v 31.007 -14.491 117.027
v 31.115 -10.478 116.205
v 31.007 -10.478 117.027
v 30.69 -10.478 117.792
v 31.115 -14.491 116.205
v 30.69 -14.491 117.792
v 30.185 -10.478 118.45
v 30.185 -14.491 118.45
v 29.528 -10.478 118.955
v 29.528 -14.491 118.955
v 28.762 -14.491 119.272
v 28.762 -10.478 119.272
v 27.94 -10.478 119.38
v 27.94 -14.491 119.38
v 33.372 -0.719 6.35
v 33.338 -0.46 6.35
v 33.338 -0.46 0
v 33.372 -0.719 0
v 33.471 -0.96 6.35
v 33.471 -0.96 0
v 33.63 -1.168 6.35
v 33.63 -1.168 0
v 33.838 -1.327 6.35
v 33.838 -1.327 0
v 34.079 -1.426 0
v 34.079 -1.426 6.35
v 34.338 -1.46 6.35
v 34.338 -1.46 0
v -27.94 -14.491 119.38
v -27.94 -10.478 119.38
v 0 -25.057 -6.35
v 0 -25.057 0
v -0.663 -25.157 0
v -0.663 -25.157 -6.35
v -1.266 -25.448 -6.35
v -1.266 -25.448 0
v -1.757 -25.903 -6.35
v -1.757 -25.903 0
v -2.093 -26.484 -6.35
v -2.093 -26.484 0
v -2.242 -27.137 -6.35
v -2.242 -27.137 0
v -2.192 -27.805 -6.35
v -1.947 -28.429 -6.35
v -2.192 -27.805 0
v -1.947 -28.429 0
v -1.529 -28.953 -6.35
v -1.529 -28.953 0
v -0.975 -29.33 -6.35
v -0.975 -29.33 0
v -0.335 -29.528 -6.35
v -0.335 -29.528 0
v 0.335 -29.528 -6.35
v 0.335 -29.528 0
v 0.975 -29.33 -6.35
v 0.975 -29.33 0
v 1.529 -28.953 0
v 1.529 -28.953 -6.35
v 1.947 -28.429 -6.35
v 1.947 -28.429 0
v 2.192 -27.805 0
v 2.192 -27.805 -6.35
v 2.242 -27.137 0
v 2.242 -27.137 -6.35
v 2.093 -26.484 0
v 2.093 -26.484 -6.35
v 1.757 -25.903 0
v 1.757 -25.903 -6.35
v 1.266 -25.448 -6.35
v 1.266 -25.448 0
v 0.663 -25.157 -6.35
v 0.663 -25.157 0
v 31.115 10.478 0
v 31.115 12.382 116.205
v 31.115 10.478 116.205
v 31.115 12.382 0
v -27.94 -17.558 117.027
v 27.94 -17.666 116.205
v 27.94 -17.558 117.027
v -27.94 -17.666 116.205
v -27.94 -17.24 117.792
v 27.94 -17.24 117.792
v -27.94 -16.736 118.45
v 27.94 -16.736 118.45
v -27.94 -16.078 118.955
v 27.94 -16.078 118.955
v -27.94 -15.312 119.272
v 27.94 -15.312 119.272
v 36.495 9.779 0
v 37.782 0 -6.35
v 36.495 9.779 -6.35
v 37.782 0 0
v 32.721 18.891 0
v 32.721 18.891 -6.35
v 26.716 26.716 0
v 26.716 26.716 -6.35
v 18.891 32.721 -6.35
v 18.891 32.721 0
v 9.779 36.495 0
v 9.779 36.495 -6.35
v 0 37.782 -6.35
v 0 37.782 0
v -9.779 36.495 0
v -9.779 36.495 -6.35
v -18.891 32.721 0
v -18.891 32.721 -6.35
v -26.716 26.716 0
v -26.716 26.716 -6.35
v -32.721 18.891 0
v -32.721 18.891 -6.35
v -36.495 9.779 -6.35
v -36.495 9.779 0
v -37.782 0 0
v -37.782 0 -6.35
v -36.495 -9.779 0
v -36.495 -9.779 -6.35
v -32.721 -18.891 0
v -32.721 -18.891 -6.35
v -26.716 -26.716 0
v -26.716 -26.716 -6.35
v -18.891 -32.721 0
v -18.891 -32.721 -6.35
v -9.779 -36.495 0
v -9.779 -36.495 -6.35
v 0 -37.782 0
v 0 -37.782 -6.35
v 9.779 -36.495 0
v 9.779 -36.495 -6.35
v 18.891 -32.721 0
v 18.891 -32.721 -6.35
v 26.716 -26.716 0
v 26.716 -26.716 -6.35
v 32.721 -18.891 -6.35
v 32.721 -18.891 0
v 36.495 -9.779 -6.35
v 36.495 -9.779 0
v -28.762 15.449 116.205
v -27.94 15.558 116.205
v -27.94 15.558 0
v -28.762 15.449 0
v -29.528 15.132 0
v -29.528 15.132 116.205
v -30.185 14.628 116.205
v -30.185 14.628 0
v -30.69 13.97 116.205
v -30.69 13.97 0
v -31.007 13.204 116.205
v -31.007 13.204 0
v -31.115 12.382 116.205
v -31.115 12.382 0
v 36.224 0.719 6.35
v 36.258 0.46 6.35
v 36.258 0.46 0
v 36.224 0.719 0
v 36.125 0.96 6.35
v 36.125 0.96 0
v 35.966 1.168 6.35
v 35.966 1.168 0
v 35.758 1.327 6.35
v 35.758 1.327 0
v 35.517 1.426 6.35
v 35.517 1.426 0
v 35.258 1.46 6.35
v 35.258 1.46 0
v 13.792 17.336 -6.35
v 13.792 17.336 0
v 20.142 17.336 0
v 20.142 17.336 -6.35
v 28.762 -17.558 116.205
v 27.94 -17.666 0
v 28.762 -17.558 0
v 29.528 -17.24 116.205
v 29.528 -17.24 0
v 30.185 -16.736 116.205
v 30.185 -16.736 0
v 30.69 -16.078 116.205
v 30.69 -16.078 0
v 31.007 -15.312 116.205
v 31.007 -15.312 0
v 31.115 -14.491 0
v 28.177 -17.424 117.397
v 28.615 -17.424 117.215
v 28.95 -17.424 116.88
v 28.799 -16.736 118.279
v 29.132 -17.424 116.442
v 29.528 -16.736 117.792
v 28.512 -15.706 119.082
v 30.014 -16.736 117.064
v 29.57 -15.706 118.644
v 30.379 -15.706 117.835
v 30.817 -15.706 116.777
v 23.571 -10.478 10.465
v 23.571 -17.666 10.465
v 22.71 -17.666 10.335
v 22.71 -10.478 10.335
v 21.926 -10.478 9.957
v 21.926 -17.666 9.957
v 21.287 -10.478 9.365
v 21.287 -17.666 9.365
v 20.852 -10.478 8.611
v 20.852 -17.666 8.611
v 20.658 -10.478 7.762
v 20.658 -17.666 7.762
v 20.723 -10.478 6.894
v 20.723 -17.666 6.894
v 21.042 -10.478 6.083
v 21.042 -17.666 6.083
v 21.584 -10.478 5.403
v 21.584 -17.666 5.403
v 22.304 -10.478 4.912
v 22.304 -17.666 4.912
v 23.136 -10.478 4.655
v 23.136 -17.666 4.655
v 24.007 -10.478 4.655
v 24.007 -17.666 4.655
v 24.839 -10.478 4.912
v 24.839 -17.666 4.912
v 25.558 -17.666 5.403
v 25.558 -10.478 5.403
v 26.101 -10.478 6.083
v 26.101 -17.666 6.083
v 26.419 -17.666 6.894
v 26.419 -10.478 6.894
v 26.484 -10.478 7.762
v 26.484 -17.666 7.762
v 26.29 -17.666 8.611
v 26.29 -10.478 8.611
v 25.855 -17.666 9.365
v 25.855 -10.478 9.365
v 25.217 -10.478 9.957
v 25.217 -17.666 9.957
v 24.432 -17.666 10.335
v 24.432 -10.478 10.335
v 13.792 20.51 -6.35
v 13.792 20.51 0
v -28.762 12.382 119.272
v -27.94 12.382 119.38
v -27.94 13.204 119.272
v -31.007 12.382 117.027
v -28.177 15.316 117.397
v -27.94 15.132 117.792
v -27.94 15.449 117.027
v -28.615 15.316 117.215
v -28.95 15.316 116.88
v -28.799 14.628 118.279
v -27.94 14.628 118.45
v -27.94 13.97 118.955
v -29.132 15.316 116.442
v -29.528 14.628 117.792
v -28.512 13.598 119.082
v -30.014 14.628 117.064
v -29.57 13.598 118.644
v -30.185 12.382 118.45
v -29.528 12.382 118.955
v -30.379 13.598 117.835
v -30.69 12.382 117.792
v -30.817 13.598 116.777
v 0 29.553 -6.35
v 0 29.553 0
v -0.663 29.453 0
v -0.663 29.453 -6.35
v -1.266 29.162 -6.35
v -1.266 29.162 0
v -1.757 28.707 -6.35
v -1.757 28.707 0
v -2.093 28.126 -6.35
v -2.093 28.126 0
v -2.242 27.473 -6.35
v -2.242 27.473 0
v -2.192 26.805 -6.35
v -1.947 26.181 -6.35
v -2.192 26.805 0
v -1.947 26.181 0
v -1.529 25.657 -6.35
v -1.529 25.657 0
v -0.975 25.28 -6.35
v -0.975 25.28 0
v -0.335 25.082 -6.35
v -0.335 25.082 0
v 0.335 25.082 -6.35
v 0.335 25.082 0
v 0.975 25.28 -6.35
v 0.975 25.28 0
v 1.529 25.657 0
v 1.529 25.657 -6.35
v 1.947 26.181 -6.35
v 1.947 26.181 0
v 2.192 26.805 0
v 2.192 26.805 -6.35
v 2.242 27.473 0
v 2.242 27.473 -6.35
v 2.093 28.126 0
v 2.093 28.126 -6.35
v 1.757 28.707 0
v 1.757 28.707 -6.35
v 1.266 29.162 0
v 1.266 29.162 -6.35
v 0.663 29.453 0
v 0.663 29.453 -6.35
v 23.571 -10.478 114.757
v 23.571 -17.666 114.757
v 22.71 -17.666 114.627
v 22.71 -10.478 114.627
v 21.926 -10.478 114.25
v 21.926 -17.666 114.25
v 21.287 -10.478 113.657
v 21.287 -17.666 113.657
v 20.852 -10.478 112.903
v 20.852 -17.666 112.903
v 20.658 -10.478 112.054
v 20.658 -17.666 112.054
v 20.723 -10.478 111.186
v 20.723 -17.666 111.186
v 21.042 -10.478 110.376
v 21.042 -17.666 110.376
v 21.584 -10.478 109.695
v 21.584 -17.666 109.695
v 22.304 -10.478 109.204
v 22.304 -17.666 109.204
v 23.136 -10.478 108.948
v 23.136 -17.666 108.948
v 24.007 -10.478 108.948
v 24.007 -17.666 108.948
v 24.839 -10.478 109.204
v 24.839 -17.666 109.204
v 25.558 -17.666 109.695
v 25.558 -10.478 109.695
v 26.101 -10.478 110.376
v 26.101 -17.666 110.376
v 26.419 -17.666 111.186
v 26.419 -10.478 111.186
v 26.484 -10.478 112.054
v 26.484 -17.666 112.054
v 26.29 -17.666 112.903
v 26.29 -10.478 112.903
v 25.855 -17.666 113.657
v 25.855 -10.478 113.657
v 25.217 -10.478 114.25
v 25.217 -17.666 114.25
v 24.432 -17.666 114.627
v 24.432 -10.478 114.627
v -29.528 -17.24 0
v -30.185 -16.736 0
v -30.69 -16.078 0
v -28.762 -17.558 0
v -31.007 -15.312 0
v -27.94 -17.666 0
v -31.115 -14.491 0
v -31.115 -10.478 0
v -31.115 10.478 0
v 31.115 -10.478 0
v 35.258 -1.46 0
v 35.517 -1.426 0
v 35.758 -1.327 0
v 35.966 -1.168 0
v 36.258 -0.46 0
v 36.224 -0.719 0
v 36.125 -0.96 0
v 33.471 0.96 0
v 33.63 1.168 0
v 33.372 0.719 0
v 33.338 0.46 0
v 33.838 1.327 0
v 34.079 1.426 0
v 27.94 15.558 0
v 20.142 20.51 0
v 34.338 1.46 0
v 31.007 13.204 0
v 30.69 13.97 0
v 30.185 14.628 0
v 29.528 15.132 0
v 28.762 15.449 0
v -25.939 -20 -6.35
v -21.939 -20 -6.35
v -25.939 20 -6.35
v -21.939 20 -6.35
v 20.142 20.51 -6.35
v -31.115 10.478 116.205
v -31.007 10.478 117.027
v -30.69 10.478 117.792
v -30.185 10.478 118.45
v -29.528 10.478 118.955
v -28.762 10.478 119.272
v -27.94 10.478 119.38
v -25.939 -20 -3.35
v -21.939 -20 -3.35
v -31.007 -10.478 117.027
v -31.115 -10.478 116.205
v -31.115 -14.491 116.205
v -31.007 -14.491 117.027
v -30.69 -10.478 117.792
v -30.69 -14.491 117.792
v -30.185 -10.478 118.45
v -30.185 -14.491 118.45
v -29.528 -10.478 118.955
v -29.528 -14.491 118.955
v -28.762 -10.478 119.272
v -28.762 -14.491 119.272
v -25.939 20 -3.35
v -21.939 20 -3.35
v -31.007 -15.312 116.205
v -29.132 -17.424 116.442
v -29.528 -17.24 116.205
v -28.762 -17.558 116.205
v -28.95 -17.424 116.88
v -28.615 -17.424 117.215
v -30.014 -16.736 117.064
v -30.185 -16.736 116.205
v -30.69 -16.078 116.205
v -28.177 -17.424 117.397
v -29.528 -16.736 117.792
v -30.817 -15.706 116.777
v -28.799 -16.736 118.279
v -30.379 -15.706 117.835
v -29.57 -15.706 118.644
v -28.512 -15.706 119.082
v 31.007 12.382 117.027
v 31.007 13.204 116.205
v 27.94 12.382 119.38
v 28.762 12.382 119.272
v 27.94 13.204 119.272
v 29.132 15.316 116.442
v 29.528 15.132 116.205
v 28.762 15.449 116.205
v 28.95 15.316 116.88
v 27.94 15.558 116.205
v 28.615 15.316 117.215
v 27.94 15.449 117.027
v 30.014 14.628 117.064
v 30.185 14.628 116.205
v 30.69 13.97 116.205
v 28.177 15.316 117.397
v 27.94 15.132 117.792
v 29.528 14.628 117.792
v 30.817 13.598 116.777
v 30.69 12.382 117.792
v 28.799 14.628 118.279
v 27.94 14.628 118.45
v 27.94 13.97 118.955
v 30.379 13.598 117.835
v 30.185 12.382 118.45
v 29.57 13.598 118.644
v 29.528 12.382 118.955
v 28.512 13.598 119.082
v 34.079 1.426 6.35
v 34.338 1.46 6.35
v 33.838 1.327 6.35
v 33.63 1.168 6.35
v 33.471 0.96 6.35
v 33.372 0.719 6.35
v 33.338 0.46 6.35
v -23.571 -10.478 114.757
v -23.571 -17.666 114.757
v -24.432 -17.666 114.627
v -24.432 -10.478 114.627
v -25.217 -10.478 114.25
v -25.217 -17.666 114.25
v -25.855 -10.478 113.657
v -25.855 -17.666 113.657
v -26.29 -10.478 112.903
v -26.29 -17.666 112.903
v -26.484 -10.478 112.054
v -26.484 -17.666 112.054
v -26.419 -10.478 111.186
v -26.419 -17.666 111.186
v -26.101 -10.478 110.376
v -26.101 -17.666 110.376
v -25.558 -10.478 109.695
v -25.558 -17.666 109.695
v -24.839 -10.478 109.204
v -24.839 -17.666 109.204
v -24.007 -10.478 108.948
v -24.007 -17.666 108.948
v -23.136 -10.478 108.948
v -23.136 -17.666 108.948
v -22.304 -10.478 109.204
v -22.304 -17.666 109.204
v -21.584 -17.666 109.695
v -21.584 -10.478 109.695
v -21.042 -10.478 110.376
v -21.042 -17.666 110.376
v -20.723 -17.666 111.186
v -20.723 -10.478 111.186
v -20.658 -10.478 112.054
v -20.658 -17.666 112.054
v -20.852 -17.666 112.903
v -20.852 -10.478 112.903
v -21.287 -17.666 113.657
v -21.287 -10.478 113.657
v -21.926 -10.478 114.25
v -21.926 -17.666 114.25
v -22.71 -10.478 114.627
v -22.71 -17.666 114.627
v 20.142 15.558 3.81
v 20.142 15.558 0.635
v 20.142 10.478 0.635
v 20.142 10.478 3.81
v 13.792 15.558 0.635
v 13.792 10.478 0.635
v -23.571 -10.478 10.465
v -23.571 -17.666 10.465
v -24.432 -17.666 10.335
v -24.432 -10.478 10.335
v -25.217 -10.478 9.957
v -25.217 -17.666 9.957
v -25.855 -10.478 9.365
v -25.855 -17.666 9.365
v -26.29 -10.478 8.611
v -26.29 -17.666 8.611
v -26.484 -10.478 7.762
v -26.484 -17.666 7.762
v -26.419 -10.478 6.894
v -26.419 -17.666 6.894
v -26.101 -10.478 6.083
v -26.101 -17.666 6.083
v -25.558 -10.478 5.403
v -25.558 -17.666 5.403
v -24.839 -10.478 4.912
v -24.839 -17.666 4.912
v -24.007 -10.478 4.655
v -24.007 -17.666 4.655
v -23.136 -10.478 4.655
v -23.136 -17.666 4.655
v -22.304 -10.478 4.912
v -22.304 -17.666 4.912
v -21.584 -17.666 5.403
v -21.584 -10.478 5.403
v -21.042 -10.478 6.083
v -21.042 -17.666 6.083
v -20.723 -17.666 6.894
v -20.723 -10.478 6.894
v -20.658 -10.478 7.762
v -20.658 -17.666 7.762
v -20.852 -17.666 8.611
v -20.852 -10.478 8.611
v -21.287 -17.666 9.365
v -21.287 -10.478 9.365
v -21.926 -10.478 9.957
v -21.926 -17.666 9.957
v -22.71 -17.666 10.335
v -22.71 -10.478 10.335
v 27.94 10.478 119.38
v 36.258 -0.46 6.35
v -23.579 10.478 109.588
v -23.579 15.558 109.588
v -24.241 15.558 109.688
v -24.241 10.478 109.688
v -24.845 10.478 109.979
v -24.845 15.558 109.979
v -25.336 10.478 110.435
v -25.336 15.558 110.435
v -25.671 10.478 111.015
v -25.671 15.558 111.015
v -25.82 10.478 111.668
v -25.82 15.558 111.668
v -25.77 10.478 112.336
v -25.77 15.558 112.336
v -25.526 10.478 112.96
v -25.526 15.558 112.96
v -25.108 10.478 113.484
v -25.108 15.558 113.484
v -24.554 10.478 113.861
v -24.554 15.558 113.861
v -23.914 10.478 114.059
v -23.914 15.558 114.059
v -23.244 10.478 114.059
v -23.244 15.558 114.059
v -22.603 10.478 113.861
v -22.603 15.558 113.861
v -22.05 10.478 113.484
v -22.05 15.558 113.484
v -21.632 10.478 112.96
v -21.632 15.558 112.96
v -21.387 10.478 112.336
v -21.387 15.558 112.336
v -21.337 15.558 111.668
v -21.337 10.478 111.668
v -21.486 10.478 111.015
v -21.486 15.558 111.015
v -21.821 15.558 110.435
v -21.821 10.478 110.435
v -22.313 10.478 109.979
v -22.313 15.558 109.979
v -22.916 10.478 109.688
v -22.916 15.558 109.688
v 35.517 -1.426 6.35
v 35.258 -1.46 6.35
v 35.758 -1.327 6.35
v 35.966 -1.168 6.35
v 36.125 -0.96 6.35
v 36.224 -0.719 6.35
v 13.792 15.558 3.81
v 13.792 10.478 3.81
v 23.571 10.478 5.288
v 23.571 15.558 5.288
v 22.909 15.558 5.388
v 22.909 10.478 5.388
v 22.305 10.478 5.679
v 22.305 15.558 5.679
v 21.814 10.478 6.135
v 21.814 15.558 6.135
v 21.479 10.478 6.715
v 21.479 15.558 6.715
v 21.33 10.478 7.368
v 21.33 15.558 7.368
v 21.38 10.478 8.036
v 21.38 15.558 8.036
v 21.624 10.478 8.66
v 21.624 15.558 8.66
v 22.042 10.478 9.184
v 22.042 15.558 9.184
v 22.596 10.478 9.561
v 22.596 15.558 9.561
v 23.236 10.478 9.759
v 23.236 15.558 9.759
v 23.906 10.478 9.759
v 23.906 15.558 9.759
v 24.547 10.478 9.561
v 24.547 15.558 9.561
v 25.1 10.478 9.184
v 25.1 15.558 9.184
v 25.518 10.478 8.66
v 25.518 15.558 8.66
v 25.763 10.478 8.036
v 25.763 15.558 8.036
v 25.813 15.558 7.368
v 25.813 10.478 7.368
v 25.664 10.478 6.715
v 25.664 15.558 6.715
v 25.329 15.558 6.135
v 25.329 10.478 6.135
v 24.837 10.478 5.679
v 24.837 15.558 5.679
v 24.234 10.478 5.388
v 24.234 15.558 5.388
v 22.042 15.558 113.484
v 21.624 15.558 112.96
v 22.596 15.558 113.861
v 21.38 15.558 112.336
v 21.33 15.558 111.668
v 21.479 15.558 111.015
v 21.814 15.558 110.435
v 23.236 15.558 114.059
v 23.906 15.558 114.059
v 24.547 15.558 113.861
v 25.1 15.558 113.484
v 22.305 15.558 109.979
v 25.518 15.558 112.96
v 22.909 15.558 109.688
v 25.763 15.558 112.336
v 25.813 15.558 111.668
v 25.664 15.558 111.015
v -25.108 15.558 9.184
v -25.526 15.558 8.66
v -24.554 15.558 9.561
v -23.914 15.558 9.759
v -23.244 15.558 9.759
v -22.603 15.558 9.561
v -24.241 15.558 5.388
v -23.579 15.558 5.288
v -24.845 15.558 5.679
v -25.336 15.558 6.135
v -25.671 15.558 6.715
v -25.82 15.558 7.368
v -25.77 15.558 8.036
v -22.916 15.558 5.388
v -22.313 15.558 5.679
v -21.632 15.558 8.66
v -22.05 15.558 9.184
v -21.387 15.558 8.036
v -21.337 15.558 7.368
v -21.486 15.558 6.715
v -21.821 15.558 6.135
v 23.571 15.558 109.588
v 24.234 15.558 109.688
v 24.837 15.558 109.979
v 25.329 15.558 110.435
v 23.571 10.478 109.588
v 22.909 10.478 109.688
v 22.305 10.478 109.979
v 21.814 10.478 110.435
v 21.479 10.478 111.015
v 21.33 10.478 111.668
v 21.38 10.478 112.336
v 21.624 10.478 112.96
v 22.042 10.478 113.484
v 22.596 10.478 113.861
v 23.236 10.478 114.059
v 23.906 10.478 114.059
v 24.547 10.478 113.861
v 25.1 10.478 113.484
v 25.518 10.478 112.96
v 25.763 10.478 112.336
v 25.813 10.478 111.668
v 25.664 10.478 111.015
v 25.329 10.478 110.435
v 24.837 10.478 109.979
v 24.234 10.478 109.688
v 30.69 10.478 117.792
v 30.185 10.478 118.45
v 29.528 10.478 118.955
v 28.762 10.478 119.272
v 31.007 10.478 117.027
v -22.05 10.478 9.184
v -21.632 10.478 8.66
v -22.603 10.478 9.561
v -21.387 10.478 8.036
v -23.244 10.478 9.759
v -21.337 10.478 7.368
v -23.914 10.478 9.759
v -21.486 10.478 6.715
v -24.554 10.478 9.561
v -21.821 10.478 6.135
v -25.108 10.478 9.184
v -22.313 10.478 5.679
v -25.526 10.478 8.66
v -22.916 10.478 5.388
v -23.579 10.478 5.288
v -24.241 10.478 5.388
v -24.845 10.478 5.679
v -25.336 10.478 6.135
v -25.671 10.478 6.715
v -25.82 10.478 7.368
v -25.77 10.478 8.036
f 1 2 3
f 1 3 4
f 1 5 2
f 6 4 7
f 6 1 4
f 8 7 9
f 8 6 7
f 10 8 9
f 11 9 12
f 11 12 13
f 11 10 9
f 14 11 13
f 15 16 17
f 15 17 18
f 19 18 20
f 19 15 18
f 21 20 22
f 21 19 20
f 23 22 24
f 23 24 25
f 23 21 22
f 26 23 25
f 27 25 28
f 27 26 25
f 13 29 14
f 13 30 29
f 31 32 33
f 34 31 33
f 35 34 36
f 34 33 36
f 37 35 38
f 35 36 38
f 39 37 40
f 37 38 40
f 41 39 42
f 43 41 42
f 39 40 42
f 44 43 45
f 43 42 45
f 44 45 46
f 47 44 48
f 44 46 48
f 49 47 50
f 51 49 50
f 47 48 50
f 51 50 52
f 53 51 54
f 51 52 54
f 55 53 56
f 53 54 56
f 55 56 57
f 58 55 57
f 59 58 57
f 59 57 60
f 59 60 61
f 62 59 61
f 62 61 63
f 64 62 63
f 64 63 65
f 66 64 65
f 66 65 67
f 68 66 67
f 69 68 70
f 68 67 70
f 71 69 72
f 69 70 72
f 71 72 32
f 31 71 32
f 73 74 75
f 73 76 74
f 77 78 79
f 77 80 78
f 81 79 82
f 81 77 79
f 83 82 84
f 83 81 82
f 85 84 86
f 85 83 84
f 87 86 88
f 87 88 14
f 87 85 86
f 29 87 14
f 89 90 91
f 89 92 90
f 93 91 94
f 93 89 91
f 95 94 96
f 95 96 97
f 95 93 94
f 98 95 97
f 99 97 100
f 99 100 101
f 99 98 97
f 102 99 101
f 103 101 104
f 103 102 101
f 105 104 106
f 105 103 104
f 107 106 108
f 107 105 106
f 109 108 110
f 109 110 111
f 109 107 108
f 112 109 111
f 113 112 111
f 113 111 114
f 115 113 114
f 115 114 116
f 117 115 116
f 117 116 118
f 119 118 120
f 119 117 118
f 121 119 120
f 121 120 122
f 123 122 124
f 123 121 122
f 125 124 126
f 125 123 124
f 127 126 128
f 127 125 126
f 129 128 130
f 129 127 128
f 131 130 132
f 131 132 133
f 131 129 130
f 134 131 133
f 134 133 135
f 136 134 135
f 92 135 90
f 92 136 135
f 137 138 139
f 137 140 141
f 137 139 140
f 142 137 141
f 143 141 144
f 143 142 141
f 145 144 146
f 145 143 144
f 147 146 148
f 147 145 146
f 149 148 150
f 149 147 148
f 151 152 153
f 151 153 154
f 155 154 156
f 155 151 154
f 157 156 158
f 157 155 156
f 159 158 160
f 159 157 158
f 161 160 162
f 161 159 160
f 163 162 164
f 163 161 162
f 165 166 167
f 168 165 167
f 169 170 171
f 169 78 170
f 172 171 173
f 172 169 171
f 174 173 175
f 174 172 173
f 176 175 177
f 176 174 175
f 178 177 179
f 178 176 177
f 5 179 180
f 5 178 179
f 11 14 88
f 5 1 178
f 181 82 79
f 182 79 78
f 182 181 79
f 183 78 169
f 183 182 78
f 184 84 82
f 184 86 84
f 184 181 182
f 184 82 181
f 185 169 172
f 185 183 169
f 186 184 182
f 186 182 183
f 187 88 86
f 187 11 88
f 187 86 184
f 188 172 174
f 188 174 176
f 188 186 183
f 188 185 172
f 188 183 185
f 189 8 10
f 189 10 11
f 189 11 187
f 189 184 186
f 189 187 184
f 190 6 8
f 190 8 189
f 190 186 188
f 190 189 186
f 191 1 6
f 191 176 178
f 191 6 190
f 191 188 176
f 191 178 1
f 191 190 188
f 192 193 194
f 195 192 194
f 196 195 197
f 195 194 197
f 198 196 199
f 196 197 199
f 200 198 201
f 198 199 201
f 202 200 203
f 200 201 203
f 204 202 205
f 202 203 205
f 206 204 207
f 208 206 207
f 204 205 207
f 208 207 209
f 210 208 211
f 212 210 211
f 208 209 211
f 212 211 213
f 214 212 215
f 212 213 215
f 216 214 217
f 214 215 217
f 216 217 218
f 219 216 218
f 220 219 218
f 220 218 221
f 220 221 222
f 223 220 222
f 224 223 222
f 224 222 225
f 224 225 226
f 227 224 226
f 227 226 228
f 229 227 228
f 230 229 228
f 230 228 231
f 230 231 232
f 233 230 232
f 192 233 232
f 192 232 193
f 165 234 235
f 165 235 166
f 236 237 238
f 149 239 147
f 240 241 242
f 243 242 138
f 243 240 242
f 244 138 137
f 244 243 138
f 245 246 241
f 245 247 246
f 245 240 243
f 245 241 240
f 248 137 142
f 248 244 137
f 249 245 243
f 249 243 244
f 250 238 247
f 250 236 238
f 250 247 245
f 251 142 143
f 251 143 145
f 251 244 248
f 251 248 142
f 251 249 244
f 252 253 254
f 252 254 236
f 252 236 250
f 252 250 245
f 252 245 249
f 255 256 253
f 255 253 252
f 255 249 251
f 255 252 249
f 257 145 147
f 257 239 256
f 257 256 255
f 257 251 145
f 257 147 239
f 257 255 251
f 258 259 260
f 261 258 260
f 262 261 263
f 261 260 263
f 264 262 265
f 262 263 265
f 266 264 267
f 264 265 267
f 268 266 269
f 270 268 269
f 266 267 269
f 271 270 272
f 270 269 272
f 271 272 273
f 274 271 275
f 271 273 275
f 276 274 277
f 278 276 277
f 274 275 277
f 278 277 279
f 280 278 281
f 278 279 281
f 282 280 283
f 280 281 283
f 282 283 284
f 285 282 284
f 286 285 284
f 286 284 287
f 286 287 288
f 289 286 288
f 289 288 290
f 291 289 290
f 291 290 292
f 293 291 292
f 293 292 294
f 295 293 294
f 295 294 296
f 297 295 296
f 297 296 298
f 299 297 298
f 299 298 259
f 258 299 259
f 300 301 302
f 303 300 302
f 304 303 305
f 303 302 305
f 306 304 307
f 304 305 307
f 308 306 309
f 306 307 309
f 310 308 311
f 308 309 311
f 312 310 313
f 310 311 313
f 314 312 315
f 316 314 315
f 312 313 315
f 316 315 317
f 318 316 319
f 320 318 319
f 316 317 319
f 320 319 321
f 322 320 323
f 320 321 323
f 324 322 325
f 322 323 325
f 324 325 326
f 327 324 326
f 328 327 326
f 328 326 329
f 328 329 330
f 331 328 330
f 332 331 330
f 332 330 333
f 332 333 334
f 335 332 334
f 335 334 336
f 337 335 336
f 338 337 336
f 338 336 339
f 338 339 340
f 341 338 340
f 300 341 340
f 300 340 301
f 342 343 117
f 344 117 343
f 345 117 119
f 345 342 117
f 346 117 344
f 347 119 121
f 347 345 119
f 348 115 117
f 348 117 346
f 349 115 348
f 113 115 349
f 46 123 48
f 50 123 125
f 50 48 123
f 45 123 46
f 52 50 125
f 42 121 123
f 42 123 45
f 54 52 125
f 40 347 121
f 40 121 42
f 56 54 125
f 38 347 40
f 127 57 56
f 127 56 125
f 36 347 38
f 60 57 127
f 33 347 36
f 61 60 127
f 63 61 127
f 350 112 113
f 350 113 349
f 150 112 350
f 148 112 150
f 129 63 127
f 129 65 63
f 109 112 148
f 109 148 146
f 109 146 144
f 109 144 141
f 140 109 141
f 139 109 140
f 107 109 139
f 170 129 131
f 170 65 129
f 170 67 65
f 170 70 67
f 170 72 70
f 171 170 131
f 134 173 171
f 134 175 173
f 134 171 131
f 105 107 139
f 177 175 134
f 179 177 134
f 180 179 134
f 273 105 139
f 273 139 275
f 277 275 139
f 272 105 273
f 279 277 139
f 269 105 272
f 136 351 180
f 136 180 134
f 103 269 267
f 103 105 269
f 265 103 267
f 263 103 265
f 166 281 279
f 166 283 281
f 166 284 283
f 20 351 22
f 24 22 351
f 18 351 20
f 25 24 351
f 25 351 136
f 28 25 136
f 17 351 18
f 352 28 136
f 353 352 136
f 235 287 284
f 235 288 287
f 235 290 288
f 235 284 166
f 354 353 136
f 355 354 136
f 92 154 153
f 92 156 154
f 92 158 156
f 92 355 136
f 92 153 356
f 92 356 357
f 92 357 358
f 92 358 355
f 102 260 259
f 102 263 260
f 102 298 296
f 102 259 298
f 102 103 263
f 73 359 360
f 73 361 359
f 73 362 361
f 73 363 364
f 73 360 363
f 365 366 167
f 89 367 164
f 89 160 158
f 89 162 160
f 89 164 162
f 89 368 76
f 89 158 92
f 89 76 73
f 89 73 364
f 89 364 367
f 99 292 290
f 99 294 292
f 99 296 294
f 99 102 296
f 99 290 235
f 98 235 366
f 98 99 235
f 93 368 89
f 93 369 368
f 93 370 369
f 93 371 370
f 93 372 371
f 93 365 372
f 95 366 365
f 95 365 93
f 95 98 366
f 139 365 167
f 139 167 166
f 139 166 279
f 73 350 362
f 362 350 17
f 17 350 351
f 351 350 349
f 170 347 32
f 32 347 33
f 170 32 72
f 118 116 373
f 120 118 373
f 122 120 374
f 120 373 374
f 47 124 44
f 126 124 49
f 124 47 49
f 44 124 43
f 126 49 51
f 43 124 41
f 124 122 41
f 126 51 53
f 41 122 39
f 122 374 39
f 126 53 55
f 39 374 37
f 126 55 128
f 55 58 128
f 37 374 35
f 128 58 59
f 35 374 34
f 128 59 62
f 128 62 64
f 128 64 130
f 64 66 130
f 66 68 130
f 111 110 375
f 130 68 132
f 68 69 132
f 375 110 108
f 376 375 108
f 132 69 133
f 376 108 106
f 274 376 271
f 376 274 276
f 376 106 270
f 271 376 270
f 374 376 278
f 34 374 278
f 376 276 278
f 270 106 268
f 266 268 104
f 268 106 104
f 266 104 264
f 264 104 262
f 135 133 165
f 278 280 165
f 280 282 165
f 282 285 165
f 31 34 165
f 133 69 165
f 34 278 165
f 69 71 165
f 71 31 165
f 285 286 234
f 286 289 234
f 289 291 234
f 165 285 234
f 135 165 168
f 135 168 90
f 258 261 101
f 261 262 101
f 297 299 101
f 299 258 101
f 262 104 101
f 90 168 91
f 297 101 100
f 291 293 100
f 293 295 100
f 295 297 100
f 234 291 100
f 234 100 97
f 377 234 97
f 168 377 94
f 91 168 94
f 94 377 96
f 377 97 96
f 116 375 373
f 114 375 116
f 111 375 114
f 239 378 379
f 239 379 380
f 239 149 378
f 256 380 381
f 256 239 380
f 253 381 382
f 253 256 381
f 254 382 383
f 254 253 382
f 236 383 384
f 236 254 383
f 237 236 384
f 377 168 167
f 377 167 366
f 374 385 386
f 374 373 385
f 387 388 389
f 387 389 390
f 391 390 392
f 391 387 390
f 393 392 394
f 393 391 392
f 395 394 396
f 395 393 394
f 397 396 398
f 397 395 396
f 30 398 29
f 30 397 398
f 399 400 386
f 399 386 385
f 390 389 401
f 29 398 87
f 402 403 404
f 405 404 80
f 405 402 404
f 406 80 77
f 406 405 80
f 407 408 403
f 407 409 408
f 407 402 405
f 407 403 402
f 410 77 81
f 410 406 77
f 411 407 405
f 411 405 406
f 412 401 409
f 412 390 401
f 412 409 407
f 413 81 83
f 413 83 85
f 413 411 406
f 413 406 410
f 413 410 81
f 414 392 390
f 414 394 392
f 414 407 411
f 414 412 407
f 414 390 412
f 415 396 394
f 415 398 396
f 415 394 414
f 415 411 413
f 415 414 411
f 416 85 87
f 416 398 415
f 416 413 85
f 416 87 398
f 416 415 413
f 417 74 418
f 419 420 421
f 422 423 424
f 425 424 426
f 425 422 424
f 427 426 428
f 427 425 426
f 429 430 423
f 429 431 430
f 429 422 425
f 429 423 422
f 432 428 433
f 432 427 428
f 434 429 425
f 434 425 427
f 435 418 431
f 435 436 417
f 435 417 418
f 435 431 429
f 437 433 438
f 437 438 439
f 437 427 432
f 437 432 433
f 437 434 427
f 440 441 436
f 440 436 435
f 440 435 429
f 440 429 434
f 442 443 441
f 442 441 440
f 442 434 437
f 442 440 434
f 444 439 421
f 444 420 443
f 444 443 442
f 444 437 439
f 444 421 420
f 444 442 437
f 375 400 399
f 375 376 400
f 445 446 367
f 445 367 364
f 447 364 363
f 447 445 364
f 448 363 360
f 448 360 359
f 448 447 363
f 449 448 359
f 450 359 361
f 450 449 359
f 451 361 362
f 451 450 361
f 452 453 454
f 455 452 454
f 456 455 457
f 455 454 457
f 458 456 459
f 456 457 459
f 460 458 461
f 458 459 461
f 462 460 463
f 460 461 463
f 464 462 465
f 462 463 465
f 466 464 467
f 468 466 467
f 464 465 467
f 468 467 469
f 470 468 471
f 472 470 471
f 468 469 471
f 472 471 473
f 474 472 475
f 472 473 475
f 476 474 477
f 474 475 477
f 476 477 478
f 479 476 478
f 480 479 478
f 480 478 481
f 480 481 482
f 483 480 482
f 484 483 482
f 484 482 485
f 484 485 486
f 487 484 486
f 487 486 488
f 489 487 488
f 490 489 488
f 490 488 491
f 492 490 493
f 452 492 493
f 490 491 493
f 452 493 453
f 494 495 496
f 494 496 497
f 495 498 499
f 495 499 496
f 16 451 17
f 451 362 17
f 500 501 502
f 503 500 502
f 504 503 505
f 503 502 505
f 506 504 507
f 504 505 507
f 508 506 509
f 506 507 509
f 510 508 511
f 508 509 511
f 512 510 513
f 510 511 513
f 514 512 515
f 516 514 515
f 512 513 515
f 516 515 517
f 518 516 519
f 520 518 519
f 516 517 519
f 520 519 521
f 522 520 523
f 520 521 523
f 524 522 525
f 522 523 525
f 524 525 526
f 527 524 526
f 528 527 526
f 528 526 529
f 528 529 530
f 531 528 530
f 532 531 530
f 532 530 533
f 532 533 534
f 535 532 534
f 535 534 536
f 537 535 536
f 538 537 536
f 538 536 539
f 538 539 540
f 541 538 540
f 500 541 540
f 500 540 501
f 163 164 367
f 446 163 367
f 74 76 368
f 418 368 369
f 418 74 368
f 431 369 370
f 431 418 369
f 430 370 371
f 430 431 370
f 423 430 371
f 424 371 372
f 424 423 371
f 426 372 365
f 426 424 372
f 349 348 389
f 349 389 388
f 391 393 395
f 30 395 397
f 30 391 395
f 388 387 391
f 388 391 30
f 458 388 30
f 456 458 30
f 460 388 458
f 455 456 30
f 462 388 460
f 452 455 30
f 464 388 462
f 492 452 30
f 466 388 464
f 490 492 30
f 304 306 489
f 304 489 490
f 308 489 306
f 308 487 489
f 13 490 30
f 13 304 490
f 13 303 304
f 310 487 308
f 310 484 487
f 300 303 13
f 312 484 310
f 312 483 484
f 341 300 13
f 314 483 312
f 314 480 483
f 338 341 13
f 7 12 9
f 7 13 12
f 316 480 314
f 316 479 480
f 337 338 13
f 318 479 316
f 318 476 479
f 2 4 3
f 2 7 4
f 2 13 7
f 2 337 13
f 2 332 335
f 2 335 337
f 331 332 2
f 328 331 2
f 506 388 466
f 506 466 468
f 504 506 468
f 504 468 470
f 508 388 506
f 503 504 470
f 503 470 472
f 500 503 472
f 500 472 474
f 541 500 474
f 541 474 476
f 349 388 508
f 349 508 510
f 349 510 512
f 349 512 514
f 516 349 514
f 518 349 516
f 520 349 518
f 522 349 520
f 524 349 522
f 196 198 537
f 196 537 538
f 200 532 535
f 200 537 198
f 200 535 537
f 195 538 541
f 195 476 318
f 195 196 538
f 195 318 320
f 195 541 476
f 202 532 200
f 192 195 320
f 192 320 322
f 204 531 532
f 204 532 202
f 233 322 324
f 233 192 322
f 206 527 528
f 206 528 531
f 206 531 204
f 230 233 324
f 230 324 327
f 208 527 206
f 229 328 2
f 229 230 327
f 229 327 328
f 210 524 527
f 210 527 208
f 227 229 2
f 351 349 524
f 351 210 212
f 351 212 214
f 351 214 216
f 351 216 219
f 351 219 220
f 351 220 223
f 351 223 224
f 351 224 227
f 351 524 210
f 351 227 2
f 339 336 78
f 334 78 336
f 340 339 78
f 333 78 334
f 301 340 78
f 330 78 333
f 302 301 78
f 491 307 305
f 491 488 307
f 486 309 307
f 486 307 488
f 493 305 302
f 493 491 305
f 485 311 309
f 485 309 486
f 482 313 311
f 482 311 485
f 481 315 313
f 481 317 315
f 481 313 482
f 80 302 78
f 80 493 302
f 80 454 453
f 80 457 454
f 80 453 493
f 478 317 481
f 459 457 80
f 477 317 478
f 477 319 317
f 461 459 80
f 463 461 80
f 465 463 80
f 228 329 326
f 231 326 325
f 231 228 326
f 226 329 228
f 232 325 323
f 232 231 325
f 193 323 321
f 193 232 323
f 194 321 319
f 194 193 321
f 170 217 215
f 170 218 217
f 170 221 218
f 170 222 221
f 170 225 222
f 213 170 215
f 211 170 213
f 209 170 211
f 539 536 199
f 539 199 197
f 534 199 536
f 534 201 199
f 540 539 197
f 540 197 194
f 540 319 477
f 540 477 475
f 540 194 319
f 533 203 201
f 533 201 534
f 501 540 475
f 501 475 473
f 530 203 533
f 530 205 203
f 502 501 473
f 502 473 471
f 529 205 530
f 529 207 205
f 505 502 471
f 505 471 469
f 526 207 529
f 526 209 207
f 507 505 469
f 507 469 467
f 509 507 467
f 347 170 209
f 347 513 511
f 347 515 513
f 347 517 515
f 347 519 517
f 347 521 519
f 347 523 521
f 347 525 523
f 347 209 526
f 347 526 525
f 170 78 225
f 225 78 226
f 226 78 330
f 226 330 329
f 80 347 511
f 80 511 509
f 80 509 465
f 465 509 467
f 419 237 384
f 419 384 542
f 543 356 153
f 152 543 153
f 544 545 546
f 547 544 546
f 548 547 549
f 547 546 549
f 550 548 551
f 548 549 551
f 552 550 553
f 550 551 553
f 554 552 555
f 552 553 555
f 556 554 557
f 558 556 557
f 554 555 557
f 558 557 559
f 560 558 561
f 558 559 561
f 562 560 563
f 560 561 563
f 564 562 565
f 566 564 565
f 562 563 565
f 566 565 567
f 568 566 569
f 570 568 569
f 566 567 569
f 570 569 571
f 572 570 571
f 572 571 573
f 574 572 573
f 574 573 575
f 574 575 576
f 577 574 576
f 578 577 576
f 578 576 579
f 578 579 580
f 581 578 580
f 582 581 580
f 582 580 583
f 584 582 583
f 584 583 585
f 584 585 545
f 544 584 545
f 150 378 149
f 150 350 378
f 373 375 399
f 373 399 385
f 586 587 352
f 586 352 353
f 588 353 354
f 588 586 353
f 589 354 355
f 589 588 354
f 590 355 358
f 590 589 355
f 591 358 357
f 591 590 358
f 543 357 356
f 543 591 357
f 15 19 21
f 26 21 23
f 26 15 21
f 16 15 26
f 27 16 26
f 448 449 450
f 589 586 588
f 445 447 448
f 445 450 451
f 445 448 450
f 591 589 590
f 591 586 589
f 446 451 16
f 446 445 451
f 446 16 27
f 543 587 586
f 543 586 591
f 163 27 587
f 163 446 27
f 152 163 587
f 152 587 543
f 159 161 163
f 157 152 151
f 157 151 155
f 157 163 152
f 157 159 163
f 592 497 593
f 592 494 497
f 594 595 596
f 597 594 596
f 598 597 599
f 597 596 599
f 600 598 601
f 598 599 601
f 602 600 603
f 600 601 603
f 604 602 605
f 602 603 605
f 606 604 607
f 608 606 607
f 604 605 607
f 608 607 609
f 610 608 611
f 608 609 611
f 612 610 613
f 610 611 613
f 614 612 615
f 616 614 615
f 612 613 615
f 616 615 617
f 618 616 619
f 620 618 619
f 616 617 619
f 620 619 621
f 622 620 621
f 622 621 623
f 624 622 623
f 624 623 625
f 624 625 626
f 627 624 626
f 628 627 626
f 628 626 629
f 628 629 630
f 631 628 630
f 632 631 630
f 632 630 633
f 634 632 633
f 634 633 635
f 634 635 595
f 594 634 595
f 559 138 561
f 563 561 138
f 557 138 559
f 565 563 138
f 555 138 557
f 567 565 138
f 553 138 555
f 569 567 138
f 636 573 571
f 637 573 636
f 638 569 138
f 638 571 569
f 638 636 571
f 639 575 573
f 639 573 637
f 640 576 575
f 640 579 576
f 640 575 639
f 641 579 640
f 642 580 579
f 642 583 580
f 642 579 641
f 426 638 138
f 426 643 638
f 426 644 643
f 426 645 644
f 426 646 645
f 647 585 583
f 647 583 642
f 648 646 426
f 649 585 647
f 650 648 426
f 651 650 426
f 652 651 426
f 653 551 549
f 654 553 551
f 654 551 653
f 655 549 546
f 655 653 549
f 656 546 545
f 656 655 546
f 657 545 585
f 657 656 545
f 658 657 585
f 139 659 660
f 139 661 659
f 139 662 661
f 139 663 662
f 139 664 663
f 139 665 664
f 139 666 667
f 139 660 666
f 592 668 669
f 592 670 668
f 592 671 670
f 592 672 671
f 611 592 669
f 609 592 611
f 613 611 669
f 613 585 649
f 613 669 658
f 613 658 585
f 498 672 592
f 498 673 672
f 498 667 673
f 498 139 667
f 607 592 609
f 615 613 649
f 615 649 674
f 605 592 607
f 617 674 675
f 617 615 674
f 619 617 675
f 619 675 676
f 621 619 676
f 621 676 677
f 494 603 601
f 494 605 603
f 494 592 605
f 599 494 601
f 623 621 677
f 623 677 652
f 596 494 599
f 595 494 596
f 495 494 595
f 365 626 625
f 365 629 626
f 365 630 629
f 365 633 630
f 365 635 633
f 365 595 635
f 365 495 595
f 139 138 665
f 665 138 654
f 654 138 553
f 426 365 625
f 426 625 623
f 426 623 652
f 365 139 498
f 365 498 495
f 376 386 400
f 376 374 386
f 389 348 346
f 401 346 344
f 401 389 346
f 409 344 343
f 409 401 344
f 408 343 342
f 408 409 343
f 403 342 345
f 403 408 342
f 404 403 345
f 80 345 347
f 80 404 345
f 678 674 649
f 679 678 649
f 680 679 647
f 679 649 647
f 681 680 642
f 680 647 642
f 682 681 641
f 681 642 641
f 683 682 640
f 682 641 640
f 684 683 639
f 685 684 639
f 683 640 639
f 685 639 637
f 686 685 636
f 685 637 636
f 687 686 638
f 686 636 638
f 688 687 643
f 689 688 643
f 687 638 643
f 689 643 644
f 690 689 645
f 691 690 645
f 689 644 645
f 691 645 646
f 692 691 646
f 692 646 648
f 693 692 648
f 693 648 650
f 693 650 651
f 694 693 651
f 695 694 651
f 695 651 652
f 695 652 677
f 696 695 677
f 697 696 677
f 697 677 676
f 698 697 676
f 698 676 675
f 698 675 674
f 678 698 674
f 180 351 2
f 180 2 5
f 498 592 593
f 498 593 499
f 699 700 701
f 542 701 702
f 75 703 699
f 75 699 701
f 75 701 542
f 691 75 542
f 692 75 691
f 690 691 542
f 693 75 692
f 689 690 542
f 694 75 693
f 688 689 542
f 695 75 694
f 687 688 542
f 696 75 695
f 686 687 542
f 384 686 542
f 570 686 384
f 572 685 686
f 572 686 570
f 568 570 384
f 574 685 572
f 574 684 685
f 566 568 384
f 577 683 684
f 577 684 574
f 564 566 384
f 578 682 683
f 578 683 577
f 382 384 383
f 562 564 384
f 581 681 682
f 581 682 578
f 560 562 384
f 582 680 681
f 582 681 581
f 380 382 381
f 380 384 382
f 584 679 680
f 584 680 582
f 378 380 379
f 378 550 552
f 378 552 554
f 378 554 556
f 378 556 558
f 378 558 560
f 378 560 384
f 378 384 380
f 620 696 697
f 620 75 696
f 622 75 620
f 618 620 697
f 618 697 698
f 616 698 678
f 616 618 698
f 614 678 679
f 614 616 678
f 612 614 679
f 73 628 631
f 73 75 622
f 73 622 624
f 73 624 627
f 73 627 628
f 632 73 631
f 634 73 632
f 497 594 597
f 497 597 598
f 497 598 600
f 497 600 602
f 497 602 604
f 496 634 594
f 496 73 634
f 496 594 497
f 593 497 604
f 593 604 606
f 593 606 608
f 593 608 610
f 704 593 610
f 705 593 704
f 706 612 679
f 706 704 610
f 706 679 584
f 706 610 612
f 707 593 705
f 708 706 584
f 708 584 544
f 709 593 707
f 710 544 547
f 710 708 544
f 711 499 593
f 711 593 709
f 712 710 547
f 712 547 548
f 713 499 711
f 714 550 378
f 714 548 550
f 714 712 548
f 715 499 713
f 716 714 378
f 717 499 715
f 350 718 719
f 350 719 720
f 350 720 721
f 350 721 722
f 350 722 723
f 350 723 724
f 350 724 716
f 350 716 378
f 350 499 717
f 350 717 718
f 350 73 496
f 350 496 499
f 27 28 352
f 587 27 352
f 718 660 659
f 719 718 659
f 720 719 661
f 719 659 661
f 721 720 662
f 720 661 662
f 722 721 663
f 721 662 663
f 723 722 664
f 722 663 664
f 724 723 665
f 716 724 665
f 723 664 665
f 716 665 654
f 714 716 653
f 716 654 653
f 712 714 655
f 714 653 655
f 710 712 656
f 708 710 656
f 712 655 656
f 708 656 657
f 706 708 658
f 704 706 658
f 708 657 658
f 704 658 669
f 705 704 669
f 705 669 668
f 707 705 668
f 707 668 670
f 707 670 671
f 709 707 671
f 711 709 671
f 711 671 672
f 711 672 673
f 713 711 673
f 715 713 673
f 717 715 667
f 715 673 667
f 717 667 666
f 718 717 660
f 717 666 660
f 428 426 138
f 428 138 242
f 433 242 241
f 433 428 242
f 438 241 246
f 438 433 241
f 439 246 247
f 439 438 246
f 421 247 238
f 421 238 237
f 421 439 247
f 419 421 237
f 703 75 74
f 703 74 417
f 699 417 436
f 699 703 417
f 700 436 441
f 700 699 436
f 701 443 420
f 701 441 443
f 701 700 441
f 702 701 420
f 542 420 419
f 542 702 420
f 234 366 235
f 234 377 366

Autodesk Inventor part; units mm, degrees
ref_plane "YZ Plane" through (0, 0, 0) normal (1, 0, 0) x (0, 1, 0)
ref_plane "XZ Plane" through (0, 0, 0) normal (0, 1, 0) x (-1, 0, 0)
ref_plane "XY Plane" through (0, 0, 0) normal (0, 0, 1) x (1, 0, 0)
sketch "Sketch1" plane through (0, 0, 0) normal (0, 0, 1) x (1, 0, 0)
  circle A0 centre (0, 0) radius 37.7825
  dimension "d0" = 75.565
extrude "Extrusion1" add sketch "Sketch1" against normal blind 6.35
sketch "Sketch2" plane through (0, 0, 0) normal (0, 0, 1) x (1, 0, 0)
  line L0 (-31.115, -10.4775) -> (31.115, -10.4775)
  line L1 (31.115, -10.4775) -> (31.115, -17.6657)
  line L2 (31.115, -17.6657) -> (-31.115, -17.6657)
  line L3 (-31.115, -17.6657) -> (-31.115, -10.4775)
  line L4 (-31.115, 15.5575) -> (31.115, 15.5575)
  line L5 (31.115, 15.5575) -> (31.115, 10.4775)
  line L6 (31.115, 10.4775) -> (-31.115, 10.4775)
  line L7 (-31.115, 10.4775) -> (-31.115, 15.5575)
  point P0 (0, 0)
  point P1 (31.115, -14.0716)
  point P2 (31.115, 13.0175)
  dimension "d3" = 7.1882
  dimension "d4" = 62.23
  dimension "d5" = 31.115
  dimension "d6" = 10.4775
  dimension "d10" = 62.23
  dimension "d11" = 31.115
  dimension "d12" = 10.4775
  dimension "d13" = 5.08
extrude "Extrusion2" add sketch "Sketch2" along normal blind 119.38
fillet "Fillet1" radius 3.175 5 edges at (-31.115, -14.0716, 119.38) (31.115, -14.0716, 119.38) (31.115, -17.6657, 59.69) (-31.115, -17.6657, 59.69) (0, -17.6657, 119.38)
fillet "Fillet2" radius 3.175 5 edges at (-31.115, 13.0175, 119.38) (31.115, 13.0175, 119.38) (-31.115, 15.5575, 59.69) (0, 15.5575, 119.38) (31.115, 15.5575, 59.69)
sketch "Sketch3" plane through (-31.115, -10.4775, 0) normal (0, 1, 0) x (1, 0, 0)
  line L0 (0, -116.205) -> (0, 0) projected
  line L1 (59.055, -119.38) -> (3.175, -119.38) projected
  line L2 (62.23, 0) -> (62.23, -116.205) projected
  line L3 (59.055, 0) -> (3.175, 0) projected
  point P0 (31.115, 0)
  point P1 (7.5438, -111.8362)
  point P2 (7.5438, -7.5438)
  point P3 (54.6862, -7.5438)
  point P4 (54.6862, -111.8362)
  dimension "d15" = 7.5438
  dimension "d16" = 7.5438
  dimension "d17" = 7.5438
  dimension "d18" = 7.5438
  dimension "d19" = 7.5438
  dimension "d20" = 7.5438
  dimension "d21" = 7.5438
  dimension "d22" = 7.5438
hole "Hole1" at (-23.5712, -10.4775, 111.8362) at (-23.5712, -10.4775, 7.5438) at (23.5712, -10.4775, 7.5438) at (23.5712, -10.4775, 111.8362) direction (0, -1, 0) diameter 5.842 end through all
sketch "Sketch4" plane through (-31.115, 10.4775, 0) normal (0, -1, 0) x (1, 0, 0)
  circle A0 centre (54.6862, 111.8362) radius 2.1717 projected
  circle A1 centre (54.6862, 7.5362) radius 2.1717 projected
  circle A2 centre (7.5362, 7.5362) radius 2.1717 projected
  circle A3 centre (7.5362, 111.8362) radius 2.1717 projected
  point P0 (31.115, 0)
hole "Hole2" at (23.5712, 10.4775, 111.8362) at (-23.5788, 10.4775, 111.8362) at (-23.5788, 10.4775, 7.5362) at (23.5712, 10.4775, 7.5362) direction (0, 1, 0) diameter 4.4958 end through all clearance for "Flat Head Machine Screw (82)" size "#8" standard "Ansi Unified Screw Threads"
sketch "Sketch5" plane through (0, 0, -6.35) normal (0, 0, -1) x (-1, 0, 0)
  circle A0 centre (0, 27.305) radius 2.921 projected
  arc A1 (-0.6096, -25.2301) -> (-0.6096, -29.3799) centre (0, -27.305) ccw projected
  point P0 (0, 0)
hole "Hole3" at (0, 27.305, -6.35) at (0, -27.305, -6.35) direction (0, 0, 1) diameter 4.4958 end through all clearance for "Flat Head Machine Screw (82)" size "#8" standard "Ansi Unified Screw Threads"
sketch "Sketch7" plane through (0, 0, -6.35) normal (0, 0, -1) x (-1, 0, 0)
  line L0 (21.939, 20) -> (25.939, 20)
  line L1 (25.939, 20) -> (25.939, -20)
  line L2 (25.939, -20) -> (21.939, -20)
  line L3 (21.939, -20) -> (21.939, 20)
  line L4 (22.439, -16.8541) -> (22.439, 16.8541) projected
  line L5 (25.439, 16.8541) -> (25.439, -16.8541) projected
  point P0 (0, 0)
  point P1 (23.939, -20)
  point P2 (23.939, 20)
  dimension "d51" = 4
  dimension "d53" = 0.5
  dimension "d54" = 40
  dimension "d55" = 20
extrude "Extrusion4" cut sketch "Sketch7" against normal blind 3
sketch "Sketch8" plane through (0, 0, -6.35) normal (0, 0, -1) x (-1, 0, 0)
  line L0 (27.94, 15.5575) -> (-27.94, 15.5575) projected
  line L1 (-20.1422, 20.5105) -> (-13.7922, 20.5105)
  line L2 (-13.7922, 20.5105) -> (-13.7922, 17.3355)
  line L3 (-13.7922, 17.3355) -> (-20.1422, 17.3355)
  line L4 (-20.1422, 17.3355) -> (-20.1422, 20.5105)
  line L5 (-20.1422, 20.3225) -> (-20.1422, 16.7818)
  point P0 (0, 0)
  dimension "d58" = 6.35
  dimension "d59" = 3.175
  dimension "d60" = 0
  dimension "d61" = 1.778
extrude "Extrusion5" cut sketch "Sketch8" against normal through all
sketch "Sketch9" plane through (-27.94, 15.5575, 0) normal (0, 1, 0) x (1, 0, 0)
  line L0 (41.7322, -0.635) -> (48.0822, -0.635)
  line L1 (48.0822, -0.635) -> (48.0822, -3.81)
  line L2 (48.0822, -3.81) -> (41.7322, -3.81)
  line L3 (41.7322, -3.81) -> (41.7322, -0.635)
  line L4 (-9.8425, 0) -> (65.7225, 0) projected
  point P0 (27.94, 0)
  point P1 (41.7322, 0)
  point P2 (48.0822, 0)
  point P3 (48.0822, -2.2225)
  dimension "d64" = 0
  dimension "d66" = 0
  dimension "d67" = 0.635
  dimension "d68" = 3.175
extrude "Extrusion6" cut sketch "Sketch9" against normal up to next
sketch "Sketch10" plane through (0, 0, 0) normal (0, 0, 1) x (1, 0, 0)
  line L0 (33.2105, 1.5875) -> (36.3855, 1.5875)
  line L1 (36.3855, 1.5875) -> (36.3855, -1.5875)
  line L2 (36.3855, -1.5875) -> (33.2105, -1.5875)
  line L3 (33.2105, -1.5875) -> (33.2105, 1.5875)
  circle A0 centre (0, 0) radius 37.7825 projected
  line L4 (36.2585, 1.4605) -> (33.3375, 1.4605)
  line L5 (33.3375, 1.4605) -> (33.3375, -1.4605)
  line L6 (33.3375, -1.4605) -> (36.2585, -1.4605)
  line L7 (36.2585, -1.4605) -> (36.2585, 1.4605)
  dimension "d71" = 3.175
  dimension "d72" = 3.175
  dimension "d73" = 36.3855
  dimension "d74" = 37.7825
  dimension "d75" = 0.127
  dimension "d79" = 1.5875
extrude "Extrusion7" add sketch "Sketch10" along normal blind 6.35 contours L7 L6 L5 L4
fillet "Fillet4" radius 1 4 edges at (33.3375, 1.4605, 3.175) (36.2585, 1.4605, 3.175) (36.2585, -1.4605, 3.175) (33.3375, -1.4605, 3.175)
equation "\"d5\" = 0.5 * d4"
equation "\"d10\" = d4"
equation "\"d11\" = 0.5 * d10"
equation "\"d12\" = d6"
equation "\"d16\" = d15"
equation "\"d17\" = d16"
equation "\"d18\" = d16"
equation "\"d19\" = d17"
equation "\"d20\" = d19"
equation "\"d21\" = d15"
equation "\"d22\" = d21"
properties part number "Supportv2_3dprinted" material "ABS Plastic"
